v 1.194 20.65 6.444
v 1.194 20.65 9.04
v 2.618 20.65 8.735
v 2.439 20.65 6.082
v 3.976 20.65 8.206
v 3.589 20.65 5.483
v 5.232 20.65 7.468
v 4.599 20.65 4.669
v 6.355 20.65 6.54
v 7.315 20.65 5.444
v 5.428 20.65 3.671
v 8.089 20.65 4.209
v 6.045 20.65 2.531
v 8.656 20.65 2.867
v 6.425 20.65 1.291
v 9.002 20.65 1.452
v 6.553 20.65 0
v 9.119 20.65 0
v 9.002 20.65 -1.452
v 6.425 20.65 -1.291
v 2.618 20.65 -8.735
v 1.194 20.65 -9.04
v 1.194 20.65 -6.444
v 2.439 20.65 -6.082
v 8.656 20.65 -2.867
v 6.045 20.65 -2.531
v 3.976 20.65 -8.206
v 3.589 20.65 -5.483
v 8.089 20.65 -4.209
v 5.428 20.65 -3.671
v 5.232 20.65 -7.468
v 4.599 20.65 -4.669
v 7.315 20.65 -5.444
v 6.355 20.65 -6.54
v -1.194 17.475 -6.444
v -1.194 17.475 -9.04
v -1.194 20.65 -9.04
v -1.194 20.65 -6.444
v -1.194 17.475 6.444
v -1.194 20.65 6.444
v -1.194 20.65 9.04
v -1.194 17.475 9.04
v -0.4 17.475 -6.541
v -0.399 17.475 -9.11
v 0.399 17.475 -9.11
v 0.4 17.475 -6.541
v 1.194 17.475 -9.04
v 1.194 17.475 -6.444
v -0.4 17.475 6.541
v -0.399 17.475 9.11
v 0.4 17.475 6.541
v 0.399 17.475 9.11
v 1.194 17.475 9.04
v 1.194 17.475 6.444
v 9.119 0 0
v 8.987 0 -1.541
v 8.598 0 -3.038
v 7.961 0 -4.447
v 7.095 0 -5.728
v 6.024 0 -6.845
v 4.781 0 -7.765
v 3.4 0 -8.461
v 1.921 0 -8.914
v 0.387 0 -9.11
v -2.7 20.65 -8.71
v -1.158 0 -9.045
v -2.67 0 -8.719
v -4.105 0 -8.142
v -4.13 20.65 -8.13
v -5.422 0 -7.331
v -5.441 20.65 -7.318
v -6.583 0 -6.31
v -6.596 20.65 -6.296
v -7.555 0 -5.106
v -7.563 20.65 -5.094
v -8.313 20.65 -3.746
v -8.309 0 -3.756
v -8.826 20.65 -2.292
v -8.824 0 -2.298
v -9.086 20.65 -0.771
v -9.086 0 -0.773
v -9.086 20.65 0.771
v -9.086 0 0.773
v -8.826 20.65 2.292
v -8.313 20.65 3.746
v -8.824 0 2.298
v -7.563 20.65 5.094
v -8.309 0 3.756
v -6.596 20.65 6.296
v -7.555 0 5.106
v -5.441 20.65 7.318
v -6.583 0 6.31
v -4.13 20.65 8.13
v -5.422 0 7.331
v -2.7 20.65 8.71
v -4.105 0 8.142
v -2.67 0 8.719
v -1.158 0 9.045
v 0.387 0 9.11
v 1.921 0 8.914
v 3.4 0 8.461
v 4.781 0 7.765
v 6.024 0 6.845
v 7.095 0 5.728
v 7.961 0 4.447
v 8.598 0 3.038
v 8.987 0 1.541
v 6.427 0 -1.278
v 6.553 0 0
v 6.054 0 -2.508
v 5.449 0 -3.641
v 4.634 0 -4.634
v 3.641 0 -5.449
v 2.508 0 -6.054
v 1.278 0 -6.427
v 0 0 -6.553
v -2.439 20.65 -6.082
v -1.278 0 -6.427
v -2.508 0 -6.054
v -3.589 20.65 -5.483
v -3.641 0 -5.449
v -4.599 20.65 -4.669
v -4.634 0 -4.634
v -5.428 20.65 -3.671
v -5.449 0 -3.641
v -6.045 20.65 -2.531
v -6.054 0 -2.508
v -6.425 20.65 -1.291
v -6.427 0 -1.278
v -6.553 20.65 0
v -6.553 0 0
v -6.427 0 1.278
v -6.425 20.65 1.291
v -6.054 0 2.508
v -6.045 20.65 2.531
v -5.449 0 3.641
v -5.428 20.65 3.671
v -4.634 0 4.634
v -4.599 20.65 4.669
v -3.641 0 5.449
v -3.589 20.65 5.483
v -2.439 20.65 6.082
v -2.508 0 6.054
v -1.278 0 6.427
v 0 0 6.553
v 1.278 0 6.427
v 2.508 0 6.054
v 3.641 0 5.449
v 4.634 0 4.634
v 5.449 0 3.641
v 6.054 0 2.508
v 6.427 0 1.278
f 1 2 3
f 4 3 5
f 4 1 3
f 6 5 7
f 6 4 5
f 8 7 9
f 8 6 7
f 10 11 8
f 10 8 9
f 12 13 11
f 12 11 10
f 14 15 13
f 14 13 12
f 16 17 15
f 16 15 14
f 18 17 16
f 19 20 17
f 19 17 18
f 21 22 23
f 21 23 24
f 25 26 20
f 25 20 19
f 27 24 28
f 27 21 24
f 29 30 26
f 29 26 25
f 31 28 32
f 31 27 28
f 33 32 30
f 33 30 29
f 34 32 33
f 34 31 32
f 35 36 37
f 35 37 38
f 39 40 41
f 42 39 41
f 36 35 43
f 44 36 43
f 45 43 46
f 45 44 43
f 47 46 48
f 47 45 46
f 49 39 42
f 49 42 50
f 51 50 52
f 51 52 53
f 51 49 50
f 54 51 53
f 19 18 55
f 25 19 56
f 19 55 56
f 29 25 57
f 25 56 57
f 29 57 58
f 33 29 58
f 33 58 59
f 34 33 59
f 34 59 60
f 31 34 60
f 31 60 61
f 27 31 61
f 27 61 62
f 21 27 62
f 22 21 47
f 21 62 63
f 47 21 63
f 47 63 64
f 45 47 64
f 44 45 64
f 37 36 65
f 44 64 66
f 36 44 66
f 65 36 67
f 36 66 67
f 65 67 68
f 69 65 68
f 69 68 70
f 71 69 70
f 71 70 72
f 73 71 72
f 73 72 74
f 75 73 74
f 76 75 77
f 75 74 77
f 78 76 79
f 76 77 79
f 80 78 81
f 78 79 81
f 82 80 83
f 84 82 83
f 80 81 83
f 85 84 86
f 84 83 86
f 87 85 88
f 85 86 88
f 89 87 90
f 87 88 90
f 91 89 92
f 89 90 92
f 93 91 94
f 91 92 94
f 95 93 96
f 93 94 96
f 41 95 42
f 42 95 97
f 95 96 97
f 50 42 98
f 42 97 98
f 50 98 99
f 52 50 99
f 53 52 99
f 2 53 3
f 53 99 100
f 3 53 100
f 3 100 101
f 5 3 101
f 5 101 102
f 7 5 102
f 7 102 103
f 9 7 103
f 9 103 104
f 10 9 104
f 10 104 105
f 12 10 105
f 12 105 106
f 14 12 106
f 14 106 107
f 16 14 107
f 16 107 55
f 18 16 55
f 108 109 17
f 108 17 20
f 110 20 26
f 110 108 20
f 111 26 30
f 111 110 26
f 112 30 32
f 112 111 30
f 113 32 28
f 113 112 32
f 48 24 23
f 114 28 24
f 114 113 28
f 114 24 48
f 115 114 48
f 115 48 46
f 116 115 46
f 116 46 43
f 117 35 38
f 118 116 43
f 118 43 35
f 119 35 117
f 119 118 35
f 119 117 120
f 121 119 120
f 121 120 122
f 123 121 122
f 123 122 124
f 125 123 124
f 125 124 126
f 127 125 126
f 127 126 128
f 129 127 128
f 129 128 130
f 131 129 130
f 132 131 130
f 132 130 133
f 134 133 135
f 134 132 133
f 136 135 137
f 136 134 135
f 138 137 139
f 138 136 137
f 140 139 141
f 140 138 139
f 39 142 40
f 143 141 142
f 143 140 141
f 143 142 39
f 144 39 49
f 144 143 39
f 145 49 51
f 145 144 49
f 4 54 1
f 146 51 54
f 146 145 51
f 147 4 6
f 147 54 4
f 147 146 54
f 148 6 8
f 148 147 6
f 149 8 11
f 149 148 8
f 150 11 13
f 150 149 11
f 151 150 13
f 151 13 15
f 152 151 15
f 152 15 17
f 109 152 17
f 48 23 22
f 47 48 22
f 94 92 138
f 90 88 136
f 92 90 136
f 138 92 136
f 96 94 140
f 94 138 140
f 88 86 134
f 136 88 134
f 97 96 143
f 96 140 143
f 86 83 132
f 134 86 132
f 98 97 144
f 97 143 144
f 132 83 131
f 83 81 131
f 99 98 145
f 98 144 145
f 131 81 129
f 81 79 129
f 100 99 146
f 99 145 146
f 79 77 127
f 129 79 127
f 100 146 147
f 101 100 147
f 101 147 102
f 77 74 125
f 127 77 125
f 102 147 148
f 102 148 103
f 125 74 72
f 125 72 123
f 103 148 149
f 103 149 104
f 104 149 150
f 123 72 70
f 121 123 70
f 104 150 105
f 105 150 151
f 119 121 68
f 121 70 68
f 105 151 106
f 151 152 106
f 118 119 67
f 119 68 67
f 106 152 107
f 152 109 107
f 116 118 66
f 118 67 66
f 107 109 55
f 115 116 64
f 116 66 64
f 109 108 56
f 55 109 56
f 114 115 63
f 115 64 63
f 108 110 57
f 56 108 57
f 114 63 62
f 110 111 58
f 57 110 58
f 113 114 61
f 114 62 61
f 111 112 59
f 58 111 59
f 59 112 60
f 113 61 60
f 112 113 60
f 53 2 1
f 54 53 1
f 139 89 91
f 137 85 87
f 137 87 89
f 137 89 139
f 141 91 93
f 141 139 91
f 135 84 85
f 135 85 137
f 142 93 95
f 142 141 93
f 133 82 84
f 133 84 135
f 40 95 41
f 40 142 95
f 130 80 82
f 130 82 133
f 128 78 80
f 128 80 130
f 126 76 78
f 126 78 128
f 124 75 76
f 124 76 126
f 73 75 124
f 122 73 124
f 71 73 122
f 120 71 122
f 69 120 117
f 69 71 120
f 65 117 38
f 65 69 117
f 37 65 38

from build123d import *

# Parameters (mm, degrees)
SKETCH2_R               = 9.1186
SKETCH2_R_2             = 6.5532
BOSS_EXTRUDE1_DEPTH     = 20.6502
CUT_EXTRUDE1_DEPTH      = 1
CUT_EXTRUDE1_DEPTH_BACK = 3.175


with BuildPart() as part:
    # Sketch2 → Boss-Extrude1 (new body)
    with BuildSketch(Plane(origin=(0, 0, 0), x_dir=(1, 0, 0), z_dir=(0, 1, 0))):
        Circle(SKETCH2_R)
        Circle(SKETCH2_R_2, mode=Mode.SUBTRACT)
    extrude(amount=BOSS_EXTRUDE1_DEPTH)

    # Sketch3 → Cut-Extrude1 (cut, two sides)
    with BuildSketch(Plane(origin=(0, 20.6502, 0), x_dir=(1, 0, 0), z_dir=(0, 1, 0))) as cut_extrude1_sk:
        with BuildLine():
            ThreePointArc((-1.1938, 6.443544972), (0, 6.5532), (1.1938, 6.443544972))
            Line((1.1938, 6.443544972), (1.1938, 9.040116566))
            ThreePointArc((1.1938, 9.040116566), (0, 9.1186), (-1.1938, 9.040116566))
            Line((-1.1938, 9.040116566), (-1.1938, 6.443544972))
        make_face()
        with BuildLine():
            Line((1.1938, -9.040116566), (1.1938, -6.443544972))
            ThreePointArc((1.1938, -6.443544972), (0, -6.5532), (-1.1938, -6.443544972))
            Line((-1.1938, -6.443544972), (-1.1938, -9.040116566))
            ThreePointArc((-1.1938, -9.040116566), (0, -9.1186), (1.1938, -9.040116566))
        make_face()
    extrude(amount=CUT_EXTRUDE1_DEPTH, mode=Mode.SUBTRACT)
    extrude(cut_extrude1_sk.sketch, amount=-CUT_EXTRUDE1_DEPTH_BACK, mode=Mode.SUBTRACT)


solid = part.part
